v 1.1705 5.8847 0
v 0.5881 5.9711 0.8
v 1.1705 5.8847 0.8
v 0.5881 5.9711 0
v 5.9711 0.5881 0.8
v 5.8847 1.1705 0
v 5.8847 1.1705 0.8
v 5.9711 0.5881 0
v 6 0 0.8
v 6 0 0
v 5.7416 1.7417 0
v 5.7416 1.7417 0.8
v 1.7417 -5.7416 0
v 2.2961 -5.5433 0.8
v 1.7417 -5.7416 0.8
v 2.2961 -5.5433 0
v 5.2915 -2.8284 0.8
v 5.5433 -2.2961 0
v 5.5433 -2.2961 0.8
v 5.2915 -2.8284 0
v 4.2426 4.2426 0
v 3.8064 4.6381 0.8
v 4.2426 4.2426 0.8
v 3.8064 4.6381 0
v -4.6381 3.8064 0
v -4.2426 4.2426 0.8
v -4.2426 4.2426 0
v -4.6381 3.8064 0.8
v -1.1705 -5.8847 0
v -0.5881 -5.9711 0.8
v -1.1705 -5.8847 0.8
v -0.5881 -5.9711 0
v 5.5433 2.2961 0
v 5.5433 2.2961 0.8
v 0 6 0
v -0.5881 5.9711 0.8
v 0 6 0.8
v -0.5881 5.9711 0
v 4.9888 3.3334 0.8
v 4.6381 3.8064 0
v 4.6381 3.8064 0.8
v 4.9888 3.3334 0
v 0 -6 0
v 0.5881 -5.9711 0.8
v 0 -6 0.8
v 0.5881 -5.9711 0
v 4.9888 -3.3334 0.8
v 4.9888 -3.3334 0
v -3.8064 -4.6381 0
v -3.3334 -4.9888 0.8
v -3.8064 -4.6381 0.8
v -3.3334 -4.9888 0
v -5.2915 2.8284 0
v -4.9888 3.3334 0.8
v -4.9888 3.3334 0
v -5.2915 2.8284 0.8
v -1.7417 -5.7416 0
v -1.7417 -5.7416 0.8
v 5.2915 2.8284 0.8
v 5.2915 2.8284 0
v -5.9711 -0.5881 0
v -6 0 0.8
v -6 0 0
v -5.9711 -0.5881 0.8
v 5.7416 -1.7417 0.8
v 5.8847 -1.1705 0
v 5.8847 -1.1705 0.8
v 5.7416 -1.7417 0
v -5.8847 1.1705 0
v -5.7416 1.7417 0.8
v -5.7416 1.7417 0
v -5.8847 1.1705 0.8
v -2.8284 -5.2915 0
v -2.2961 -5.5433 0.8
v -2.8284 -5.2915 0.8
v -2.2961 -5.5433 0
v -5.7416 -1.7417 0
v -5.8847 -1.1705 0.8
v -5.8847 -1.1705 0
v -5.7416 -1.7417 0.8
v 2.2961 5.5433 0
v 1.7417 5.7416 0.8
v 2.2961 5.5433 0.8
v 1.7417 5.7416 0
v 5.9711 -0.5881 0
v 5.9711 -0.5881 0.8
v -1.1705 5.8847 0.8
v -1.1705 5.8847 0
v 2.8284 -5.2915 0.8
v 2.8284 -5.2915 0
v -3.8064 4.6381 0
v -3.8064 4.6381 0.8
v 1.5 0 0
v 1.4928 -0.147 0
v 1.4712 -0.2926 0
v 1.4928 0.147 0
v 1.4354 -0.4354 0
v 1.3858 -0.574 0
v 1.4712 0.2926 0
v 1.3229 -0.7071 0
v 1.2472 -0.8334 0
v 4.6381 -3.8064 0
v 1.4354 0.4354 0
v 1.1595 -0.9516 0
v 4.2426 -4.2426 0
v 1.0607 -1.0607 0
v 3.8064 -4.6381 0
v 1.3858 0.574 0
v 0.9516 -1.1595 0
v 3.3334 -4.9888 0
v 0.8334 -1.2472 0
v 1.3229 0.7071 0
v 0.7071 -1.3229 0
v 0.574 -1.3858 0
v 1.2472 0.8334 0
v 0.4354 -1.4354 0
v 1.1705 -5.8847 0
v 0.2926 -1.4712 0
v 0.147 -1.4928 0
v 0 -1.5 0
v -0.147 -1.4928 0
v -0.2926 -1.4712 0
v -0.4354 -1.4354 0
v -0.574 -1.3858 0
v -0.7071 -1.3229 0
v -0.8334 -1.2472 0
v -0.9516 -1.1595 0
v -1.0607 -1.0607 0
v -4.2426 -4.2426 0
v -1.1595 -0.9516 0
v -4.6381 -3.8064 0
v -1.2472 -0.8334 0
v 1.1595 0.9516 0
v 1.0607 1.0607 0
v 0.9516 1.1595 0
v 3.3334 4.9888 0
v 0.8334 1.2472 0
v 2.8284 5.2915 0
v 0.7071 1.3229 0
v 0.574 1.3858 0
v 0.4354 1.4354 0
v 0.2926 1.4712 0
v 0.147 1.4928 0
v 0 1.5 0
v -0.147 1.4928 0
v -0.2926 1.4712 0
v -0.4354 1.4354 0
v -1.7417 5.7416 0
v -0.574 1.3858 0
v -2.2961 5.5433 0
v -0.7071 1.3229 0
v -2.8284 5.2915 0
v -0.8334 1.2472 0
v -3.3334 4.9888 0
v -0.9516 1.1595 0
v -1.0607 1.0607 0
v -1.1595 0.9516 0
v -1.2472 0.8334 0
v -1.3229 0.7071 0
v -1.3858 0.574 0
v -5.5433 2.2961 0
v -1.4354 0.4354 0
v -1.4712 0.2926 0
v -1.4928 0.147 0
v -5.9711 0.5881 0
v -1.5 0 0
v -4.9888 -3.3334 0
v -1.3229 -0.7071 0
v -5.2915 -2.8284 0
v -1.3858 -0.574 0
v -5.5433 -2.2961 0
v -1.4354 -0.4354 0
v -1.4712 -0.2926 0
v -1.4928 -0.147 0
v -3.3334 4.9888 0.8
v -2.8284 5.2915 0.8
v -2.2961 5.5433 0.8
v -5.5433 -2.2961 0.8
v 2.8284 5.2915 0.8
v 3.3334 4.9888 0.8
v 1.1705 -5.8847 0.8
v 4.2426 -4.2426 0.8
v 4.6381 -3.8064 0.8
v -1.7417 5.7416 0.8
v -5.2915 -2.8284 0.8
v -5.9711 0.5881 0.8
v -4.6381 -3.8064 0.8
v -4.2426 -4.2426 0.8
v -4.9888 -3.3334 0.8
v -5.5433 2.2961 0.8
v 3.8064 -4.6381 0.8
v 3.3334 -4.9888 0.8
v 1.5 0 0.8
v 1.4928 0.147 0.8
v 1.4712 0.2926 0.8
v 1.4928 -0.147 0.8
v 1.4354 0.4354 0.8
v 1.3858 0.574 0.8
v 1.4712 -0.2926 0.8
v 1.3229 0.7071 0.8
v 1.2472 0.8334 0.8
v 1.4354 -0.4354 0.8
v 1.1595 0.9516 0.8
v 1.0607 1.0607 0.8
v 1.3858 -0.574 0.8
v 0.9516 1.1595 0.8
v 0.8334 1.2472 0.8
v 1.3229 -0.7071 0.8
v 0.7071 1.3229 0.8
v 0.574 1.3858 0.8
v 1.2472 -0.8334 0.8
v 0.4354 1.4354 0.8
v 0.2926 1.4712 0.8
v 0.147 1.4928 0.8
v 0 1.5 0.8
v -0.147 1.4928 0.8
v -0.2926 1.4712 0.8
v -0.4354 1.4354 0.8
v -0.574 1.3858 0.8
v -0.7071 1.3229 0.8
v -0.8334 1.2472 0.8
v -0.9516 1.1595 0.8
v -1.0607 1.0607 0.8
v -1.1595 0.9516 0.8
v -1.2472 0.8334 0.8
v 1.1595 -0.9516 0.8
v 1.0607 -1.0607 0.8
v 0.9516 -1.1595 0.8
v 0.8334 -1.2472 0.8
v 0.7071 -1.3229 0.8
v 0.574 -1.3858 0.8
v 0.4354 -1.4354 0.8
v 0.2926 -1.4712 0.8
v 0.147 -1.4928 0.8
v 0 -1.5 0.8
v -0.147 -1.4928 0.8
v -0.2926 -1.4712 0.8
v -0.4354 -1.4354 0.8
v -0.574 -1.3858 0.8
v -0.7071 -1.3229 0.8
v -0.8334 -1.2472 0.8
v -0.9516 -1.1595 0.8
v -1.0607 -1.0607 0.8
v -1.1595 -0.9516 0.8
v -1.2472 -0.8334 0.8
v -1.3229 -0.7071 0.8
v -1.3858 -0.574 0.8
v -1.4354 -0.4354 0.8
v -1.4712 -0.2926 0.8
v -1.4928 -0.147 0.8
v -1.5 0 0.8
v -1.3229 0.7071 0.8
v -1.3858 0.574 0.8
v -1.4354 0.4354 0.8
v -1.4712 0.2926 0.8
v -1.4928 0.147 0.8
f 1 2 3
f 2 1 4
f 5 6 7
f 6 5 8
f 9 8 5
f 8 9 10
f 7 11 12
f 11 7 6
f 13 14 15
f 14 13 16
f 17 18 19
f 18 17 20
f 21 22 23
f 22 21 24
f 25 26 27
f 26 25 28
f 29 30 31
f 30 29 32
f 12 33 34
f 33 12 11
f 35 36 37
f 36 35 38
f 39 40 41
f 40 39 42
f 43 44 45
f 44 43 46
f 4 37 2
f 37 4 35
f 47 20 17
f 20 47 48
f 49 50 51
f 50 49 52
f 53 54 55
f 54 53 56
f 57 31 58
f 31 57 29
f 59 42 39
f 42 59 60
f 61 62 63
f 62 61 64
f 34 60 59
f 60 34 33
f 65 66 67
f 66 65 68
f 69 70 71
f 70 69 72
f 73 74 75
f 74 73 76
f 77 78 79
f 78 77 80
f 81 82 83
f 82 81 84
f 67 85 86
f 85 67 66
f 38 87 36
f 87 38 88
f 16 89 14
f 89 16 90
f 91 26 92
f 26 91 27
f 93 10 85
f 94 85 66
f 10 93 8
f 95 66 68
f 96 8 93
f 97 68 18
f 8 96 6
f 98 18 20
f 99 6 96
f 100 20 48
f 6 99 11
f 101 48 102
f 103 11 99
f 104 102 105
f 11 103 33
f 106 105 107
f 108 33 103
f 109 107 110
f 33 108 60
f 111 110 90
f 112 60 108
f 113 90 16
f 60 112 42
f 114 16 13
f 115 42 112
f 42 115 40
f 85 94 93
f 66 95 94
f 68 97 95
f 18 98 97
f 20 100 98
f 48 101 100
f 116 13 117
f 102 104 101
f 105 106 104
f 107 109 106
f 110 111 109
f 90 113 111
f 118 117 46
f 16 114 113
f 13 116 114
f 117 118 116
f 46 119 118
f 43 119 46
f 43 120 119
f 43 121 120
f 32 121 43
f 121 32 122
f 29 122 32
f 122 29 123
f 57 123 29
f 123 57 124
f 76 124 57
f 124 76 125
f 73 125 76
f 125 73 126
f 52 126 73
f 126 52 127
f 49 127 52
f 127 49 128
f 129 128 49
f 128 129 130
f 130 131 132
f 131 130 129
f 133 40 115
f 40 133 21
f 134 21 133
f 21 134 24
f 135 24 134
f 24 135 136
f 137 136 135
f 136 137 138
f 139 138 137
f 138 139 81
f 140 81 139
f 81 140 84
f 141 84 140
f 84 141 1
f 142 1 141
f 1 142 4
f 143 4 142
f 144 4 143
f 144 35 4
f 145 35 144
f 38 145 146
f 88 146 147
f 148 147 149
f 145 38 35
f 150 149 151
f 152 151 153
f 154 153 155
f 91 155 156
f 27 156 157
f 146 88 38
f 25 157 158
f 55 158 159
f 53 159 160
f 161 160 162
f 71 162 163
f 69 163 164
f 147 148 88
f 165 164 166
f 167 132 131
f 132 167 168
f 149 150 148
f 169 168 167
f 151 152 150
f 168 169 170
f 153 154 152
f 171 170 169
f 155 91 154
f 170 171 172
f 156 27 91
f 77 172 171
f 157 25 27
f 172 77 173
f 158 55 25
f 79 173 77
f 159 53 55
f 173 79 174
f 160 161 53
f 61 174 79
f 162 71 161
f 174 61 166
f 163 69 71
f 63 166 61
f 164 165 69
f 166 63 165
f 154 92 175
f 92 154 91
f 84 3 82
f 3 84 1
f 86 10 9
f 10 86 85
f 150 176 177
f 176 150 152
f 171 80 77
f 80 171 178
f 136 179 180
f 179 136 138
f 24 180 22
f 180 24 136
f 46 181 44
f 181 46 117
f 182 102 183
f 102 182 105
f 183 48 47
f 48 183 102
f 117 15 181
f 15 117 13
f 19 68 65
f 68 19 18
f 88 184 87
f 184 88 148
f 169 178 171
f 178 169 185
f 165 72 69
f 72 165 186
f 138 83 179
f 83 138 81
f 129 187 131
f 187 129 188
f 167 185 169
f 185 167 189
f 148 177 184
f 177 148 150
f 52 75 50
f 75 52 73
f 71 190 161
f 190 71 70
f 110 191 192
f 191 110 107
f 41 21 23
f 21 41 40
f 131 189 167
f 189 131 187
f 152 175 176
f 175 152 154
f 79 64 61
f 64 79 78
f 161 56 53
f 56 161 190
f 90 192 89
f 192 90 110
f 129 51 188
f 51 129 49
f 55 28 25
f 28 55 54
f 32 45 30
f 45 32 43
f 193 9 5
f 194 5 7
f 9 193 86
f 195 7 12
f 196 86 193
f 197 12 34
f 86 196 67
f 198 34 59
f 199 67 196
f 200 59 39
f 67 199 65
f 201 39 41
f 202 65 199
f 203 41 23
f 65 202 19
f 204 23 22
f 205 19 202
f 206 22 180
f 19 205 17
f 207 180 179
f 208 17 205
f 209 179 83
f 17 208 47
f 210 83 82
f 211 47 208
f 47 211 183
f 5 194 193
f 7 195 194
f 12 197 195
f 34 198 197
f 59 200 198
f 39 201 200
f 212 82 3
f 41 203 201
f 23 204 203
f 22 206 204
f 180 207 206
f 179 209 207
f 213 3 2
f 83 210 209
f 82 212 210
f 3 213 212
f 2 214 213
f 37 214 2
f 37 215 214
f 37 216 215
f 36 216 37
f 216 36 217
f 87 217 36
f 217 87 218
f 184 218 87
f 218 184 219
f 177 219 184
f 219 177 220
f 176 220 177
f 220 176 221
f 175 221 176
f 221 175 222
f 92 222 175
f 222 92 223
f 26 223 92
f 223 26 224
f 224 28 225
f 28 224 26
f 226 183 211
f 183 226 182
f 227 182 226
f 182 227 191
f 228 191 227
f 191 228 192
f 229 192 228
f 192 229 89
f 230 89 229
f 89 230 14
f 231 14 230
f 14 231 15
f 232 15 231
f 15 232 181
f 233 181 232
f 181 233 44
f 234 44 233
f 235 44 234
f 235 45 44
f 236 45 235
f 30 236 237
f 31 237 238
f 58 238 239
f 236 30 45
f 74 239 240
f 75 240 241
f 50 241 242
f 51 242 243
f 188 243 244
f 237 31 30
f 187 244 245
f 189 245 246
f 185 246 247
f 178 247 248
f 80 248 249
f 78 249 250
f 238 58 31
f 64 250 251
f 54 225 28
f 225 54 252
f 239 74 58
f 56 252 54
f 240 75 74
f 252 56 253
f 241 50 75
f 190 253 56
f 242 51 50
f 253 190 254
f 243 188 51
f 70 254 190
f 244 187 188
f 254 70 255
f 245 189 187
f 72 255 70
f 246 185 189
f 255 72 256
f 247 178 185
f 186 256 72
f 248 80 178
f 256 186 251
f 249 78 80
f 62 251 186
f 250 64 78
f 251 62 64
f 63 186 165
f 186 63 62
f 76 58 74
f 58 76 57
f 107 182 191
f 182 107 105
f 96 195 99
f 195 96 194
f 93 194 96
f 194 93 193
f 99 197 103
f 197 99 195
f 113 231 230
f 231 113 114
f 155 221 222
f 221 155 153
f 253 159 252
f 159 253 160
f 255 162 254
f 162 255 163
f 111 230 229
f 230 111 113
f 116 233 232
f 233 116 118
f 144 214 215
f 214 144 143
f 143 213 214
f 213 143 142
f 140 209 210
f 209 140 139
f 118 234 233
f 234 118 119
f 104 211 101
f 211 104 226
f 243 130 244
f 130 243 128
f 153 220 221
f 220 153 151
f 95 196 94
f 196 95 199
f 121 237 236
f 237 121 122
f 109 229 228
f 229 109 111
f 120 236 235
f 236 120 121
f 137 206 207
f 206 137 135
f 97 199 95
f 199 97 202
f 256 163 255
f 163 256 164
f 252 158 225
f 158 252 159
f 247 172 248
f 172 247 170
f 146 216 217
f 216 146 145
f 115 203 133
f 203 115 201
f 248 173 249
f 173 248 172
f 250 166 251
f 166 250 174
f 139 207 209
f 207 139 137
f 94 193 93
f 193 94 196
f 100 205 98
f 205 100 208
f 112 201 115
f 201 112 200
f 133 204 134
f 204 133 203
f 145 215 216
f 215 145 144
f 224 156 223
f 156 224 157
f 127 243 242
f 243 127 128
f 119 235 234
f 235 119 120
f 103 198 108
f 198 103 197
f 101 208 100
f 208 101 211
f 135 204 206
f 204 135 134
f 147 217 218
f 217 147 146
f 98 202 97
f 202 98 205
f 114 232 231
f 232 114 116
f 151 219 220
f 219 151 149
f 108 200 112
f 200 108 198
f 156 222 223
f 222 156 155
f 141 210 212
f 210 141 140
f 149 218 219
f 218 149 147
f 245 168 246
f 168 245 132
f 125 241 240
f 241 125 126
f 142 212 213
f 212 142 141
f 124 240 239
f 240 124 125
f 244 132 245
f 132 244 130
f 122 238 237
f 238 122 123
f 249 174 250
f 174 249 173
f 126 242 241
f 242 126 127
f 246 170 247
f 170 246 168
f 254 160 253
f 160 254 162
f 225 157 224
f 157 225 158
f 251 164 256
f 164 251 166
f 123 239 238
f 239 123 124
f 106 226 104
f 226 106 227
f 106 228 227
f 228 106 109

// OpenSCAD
difference() {
    cylinder(h=0.8, d=12.0, $fn=64);
    translate([0, 0, -0.1])
        cylinder(h=1.0, d=3.0, $fn=64);
}
